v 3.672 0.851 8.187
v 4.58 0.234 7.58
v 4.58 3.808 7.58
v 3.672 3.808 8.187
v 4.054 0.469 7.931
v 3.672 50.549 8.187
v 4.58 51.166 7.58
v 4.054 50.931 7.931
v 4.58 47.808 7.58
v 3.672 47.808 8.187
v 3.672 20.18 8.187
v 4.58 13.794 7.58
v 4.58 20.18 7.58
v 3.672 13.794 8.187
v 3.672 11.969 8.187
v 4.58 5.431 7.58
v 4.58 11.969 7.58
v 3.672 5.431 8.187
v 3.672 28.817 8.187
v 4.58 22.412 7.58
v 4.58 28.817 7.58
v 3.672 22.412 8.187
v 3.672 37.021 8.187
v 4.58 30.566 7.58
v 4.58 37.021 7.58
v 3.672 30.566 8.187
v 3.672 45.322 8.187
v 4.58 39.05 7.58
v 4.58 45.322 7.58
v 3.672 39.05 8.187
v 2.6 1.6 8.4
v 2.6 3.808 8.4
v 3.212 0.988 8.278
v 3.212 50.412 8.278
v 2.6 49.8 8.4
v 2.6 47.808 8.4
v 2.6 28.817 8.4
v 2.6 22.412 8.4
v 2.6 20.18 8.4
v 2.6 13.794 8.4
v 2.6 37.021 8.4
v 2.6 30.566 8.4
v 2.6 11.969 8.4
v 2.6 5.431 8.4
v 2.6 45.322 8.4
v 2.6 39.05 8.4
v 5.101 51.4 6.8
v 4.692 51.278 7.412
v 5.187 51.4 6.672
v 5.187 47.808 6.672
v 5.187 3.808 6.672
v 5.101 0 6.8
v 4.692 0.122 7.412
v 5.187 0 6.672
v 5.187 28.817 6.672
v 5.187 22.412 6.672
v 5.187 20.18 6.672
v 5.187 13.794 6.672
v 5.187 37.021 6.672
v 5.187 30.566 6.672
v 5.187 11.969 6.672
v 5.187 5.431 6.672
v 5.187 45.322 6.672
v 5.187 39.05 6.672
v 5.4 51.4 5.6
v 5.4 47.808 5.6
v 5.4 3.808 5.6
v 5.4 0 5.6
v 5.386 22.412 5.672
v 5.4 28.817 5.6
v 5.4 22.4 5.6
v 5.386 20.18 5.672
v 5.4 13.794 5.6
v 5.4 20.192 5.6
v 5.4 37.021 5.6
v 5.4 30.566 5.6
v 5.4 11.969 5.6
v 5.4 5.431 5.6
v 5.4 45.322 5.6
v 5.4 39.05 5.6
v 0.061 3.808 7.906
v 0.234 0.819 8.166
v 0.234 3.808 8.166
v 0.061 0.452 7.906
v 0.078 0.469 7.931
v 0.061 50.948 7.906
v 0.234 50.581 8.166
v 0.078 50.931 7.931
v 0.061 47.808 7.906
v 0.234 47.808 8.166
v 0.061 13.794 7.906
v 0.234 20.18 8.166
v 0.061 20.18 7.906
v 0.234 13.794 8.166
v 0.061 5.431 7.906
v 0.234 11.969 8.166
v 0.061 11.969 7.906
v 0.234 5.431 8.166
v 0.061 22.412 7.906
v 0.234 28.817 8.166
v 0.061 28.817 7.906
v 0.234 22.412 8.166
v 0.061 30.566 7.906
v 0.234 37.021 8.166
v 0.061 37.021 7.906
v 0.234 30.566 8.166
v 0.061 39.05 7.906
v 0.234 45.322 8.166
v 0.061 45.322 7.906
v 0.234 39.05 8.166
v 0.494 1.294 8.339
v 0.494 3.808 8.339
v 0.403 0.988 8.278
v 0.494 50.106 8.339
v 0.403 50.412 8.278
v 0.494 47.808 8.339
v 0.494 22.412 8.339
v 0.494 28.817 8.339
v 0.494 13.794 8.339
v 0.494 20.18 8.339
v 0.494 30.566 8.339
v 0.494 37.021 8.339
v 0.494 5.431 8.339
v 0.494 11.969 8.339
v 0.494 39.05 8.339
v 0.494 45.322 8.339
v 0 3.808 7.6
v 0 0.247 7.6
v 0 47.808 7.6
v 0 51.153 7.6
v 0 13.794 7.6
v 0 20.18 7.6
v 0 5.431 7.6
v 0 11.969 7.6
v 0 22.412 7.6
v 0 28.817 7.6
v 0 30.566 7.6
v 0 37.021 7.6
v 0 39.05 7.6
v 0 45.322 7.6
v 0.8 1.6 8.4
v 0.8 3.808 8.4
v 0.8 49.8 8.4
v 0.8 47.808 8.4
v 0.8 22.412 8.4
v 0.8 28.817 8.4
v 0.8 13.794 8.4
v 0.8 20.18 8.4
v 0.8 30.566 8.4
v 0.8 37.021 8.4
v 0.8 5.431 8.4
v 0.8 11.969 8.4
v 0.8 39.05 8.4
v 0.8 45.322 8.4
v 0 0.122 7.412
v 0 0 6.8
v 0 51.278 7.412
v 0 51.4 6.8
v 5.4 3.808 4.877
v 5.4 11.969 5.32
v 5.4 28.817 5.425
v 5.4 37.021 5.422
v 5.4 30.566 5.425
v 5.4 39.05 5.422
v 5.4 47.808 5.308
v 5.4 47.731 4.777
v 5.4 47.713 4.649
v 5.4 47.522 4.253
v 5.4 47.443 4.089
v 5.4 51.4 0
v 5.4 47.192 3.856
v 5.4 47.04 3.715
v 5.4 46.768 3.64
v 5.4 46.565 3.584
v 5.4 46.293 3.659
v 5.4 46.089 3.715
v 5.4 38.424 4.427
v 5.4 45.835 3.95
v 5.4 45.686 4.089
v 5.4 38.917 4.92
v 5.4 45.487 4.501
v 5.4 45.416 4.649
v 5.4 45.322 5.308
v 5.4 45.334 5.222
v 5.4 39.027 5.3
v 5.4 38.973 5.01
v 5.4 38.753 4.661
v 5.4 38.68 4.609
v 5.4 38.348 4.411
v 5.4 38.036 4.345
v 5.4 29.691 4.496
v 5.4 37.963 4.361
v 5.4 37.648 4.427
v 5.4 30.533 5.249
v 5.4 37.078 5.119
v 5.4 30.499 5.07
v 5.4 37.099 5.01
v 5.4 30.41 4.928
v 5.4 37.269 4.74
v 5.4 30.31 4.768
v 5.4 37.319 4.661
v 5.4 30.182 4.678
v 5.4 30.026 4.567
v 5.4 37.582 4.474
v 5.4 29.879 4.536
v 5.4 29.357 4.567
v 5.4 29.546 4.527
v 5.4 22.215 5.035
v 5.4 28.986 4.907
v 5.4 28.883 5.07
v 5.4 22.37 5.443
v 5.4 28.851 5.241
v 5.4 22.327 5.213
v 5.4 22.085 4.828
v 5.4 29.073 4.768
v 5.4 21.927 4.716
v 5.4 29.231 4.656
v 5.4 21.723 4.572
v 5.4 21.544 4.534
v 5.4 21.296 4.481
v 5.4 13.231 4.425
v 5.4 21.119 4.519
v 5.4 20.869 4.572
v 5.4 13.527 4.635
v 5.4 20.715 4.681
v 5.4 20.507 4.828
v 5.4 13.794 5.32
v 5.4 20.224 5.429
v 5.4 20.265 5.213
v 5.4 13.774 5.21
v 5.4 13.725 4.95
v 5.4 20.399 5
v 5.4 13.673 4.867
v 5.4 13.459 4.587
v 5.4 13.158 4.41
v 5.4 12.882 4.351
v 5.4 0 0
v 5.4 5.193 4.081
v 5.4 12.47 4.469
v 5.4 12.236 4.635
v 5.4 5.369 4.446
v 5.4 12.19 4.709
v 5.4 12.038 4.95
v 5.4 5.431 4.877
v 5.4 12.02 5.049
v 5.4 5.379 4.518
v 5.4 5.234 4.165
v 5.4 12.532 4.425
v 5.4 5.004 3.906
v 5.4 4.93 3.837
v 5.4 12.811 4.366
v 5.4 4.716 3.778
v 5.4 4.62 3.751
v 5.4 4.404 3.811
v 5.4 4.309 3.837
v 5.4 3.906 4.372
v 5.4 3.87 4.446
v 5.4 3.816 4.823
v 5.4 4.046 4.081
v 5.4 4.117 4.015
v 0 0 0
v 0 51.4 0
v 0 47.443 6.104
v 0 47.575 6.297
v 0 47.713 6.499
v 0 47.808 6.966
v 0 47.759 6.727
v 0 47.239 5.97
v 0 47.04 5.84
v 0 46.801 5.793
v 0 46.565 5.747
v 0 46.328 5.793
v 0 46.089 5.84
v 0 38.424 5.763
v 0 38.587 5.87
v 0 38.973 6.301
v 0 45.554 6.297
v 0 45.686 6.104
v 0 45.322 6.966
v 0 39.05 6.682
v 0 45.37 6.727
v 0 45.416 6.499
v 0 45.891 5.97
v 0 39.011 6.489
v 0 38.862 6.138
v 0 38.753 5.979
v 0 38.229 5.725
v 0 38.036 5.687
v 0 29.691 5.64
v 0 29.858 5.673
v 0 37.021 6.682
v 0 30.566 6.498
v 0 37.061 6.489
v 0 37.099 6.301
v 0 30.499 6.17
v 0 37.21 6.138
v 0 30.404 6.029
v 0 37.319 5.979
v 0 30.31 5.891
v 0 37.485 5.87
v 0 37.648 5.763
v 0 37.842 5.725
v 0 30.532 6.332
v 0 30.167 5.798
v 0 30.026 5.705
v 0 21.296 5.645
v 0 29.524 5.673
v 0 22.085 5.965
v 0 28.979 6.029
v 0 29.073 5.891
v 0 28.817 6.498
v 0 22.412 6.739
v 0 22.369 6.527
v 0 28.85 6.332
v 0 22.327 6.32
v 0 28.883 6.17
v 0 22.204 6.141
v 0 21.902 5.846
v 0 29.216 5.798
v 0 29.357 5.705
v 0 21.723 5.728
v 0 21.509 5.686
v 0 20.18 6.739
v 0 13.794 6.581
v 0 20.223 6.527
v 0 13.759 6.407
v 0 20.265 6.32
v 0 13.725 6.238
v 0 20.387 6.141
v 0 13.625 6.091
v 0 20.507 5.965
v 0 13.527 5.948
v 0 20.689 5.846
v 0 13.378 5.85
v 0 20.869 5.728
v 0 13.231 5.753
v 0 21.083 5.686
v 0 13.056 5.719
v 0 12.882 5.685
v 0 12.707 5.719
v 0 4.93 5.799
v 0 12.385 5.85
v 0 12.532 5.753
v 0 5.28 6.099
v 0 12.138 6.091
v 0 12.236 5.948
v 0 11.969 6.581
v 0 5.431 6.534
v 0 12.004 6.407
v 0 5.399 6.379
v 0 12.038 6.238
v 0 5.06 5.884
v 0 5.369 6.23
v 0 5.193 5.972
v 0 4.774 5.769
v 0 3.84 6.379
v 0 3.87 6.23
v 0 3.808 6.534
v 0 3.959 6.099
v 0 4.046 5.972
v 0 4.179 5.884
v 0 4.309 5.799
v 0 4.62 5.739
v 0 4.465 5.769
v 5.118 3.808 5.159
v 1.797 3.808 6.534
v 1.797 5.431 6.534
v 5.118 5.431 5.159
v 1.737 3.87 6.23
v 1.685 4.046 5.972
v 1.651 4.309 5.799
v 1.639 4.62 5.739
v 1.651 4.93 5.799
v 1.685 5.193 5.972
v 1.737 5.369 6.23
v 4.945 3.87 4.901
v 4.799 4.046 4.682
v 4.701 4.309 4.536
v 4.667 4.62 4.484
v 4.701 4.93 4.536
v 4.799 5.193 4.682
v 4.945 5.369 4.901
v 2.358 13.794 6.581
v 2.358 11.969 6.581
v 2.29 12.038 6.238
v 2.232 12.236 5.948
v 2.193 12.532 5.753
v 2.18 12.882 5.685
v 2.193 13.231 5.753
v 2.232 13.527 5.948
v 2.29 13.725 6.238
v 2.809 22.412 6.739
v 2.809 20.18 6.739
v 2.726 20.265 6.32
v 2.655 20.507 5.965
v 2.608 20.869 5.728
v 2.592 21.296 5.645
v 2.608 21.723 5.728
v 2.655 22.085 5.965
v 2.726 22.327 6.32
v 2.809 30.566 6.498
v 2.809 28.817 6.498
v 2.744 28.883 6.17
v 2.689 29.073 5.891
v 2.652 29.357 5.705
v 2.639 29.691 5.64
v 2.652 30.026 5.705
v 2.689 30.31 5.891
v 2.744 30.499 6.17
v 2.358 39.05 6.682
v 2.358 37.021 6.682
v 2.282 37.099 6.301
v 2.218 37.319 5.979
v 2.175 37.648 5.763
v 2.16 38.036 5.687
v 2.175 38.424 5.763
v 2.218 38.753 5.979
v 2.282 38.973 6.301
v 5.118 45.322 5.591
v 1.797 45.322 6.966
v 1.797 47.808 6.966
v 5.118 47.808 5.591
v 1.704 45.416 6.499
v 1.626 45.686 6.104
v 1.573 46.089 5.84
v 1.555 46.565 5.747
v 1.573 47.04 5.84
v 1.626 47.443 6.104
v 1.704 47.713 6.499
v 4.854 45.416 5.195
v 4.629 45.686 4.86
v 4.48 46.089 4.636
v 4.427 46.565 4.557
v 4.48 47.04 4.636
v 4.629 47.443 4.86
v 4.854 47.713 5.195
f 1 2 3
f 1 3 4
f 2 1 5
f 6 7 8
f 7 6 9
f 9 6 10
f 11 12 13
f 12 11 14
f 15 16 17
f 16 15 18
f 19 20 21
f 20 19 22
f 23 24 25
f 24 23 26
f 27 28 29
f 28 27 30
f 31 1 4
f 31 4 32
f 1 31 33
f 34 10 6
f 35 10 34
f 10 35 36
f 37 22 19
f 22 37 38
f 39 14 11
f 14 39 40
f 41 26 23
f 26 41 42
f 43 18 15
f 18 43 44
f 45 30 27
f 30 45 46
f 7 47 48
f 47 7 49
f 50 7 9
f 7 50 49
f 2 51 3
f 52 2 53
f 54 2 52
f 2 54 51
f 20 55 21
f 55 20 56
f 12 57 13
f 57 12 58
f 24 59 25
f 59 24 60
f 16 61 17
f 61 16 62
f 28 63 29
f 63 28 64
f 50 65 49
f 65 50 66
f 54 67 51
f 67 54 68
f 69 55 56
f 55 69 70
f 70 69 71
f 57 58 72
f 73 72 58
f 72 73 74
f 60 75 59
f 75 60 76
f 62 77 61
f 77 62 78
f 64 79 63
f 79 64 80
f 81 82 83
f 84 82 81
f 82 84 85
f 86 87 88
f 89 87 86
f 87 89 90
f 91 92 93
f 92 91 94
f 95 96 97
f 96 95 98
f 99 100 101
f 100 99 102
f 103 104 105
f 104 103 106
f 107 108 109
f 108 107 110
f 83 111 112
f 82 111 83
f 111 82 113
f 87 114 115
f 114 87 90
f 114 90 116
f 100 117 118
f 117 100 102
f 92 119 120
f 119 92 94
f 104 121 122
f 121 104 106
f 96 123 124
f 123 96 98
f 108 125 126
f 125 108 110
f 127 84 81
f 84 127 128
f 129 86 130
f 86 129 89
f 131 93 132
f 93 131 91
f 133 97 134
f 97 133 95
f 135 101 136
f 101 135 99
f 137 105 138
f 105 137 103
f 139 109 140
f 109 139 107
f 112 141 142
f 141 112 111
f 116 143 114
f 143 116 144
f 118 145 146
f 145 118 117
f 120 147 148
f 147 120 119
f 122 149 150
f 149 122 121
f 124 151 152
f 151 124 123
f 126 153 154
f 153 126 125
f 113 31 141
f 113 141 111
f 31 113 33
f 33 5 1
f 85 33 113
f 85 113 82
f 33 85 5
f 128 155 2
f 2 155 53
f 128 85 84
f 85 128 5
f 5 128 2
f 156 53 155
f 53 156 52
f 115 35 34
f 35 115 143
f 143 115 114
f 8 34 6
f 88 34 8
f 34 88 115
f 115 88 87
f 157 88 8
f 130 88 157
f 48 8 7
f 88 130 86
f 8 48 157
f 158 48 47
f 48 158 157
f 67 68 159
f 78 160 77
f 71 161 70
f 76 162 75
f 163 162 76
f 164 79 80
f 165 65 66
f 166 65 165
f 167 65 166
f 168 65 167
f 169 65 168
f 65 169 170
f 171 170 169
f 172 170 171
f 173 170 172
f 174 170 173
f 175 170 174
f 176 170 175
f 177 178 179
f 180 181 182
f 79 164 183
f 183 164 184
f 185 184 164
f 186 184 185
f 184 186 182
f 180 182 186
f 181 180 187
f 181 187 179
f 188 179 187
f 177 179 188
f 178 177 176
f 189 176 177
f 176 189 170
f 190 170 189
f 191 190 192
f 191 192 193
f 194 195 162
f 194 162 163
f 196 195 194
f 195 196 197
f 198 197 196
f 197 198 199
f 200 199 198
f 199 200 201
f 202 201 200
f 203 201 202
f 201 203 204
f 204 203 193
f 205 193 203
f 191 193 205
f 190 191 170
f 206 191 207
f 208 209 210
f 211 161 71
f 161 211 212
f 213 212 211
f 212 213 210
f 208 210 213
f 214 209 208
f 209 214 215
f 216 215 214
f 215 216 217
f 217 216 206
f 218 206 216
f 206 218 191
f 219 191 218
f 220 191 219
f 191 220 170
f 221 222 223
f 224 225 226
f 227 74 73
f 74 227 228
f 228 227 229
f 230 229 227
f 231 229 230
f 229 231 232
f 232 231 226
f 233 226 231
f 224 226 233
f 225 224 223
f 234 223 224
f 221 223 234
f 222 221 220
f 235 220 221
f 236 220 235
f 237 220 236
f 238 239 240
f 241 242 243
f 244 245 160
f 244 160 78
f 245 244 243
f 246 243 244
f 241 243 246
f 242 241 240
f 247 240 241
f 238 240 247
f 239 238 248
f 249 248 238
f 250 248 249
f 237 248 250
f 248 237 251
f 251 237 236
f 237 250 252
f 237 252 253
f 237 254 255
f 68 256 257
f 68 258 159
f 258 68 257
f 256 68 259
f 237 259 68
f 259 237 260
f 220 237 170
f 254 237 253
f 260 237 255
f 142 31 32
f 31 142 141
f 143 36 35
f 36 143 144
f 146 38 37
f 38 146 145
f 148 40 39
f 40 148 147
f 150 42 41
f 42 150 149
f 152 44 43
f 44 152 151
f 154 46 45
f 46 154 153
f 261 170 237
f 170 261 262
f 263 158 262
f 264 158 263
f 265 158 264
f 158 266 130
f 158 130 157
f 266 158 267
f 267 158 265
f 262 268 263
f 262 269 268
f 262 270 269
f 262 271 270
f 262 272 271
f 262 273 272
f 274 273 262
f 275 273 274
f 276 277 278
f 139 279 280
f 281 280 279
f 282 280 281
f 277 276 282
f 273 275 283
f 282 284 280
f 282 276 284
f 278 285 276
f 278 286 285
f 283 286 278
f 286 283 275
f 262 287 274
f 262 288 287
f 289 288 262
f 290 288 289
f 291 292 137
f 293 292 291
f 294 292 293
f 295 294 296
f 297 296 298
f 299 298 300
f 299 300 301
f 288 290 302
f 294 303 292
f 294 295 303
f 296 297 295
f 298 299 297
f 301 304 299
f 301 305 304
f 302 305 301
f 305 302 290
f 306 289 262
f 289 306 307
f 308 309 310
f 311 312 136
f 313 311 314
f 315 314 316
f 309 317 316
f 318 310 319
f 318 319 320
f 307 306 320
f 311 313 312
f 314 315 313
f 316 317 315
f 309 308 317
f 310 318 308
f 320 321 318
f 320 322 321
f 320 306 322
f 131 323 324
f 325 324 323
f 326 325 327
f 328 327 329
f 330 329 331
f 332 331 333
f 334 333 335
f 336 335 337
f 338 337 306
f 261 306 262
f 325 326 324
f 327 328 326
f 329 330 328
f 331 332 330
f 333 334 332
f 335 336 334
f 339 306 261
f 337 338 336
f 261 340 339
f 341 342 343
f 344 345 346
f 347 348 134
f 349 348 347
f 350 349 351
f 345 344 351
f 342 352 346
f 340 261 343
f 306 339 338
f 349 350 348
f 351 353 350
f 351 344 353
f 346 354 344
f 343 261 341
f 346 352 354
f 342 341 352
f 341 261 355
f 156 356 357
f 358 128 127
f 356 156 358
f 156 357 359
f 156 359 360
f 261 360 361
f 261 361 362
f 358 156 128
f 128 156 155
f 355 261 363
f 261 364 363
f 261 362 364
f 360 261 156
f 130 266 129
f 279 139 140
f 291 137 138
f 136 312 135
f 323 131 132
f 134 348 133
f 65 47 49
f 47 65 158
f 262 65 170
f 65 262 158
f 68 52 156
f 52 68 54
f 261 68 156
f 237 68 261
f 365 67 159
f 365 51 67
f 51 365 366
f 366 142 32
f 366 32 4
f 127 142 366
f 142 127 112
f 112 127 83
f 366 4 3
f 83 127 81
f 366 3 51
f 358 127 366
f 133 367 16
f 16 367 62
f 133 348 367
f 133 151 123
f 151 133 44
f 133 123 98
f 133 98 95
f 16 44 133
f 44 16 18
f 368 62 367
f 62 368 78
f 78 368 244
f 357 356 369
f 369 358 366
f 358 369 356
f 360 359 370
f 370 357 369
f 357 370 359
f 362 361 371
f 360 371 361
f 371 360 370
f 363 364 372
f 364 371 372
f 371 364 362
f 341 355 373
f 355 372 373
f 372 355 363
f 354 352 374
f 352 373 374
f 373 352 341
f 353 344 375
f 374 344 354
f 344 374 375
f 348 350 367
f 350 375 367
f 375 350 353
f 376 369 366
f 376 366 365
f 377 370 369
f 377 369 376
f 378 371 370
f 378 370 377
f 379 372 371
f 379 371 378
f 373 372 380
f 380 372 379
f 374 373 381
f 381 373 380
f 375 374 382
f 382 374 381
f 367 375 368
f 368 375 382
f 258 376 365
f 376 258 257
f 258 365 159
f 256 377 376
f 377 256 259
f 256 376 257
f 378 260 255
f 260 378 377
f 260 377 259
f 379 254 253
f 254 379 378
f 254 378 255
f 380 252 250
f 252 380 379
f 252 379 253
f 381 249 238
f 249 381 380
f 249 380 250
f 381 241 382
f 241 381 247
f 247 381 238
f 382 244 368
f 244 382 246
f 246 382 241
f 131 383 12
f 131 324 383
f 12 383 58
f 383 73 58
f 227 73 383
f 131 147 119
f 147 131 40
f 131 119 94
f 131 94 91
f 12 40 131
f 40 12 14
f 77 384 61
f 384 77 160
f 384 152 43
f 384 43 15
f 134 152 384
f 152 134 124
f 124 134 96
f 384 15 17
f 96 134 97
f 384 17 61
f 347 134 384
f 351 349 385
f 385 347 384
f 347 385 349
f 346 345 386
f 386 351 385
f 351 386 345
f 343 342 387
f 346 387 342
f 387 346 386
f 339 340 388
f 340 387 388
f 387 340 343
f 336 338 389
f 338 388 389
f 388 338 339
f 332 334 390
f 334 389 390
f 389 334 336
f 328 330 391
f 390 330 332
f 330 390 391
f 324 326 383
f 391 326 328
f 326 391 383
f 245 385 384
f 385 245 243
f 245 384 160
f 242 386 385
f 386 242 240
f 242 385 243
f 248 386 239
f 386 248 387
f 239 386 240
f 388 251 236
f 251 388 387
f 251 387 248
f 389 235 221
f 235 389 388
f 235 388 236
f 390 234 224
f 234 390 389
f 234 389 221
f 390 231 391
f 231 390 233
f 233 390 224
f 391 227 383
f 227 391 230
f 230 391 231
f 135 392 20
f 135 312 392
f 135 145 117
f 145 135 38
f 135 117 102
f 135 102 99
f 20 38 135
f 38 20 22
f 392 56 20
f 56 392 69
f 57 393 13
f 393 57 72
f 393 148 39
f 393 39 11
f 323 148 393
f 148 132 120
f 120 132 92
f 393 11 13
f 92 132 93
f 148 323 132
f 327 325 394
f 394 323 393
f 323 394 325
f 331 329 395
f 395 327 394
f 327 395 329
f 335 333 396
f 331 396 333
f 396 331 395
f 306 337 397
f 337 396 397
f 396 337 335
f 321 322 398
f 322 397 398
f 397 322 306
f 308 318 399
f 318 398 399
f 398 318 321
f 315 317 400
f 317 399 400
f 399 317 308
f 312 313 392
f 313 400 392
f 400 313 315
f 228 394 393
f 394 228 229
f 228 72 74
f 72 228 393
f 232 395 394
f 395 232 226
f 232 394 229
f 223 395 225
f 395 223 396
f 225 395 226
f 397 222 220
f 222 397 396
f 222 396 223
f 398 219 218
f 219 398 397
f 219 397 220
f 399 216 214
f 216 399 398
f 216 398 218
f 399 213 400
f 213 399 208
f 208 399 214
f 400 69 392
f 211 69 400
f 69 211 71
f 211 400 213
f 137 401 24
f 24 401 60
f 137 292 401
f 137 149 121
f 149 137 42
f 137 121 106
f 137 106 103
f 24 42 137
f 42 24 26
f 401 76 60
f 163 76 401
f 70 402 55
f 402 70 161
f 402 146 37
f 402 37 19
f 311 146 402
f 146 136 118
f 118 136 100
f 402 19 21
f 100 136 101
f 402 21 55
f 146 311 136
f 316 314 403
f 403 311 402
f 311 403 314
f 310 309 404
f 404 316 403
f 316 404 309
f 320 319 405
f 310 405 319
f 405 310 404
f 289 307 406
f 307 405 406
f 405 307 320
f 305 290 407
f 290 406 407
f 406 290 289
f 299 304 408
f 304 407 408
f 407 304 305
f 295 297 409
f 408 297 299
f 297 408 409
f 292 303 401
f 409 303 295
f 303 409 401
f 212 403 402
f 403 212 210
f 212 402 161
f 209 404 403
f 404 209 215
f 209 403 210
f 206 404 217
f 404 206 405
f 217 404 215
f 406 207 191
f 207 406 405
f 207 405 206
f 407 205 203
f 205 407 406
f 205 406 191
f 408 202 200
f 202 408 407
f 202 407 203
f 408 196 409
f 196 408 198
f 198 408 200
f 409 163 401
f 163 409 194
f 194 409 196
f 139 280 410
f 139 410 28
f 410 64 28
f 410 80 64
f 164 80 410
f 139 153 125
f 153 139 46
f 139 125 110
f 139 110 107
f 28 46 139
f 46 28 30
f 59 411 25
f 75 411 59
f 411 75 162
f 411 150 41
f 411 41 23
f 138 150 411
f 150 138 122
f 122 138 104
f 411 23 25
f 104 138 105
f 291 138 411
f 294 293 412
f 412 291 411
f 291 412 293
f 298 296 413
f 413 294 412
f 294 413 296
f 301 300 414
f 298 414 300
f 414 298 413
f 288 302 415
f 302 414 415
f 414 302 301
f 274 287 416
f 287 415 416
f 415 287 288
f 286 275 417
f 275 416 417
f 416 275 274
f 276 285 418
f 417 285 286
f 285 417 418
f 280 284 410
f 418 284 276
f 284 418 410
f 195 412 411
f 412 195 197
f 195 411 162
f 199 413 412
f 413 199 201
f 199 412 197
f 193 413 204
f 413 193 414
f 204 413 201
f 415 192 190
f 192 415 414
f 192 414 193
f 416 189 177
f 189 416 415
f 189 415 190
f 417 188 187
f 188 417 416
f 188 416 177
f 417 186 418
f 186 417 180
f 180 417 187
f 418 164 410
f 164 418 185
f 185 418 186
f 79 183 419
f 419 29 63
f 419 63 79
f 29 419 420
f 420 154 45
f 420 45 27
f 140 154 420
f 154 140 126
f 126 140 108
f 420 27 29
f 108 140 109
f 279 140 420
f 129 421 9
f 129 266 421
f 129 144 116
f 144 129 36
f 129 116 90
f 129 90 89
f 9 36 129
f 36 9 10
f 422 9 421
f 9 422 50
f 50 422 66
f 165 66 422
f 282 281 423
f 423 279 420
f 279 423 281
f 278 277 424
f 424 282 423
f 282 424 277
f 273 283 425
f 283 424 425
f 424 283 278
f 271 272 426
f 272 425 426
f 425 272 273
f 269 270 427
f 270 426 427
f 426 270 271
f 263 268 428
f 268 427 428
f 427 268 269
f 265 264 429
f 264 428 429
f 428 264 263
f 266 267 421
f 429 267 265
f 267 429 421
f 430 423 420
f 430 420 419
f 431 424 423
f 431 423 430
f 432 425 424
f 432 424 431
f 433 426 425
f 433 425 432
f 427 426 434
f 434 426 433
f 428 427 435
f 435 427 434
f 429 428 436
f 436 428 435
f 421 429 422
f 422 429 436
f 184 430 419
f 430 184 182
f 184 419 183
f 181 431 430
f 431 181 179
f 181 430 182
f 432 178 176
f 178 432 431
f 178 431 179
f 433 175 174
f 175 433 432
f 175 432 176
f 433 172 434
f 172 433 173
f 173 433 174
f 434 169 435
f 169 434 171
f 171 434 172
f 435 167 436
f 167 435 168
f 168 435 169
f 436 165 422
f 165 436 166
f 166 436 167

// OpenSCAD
// file: shapes.scad
// The invocation `hollow_cylinder(h, r0, r1)` produces a hollow cylinder
// with the height `h`, the inner radius `r0` and the outer radius `r1`.
// The base of the cylinder is placed at the origin and
// its height grows along the `z` axis.
module hollow_cylinder(h, r0, r1) {
  difference() {
    cylinder(h, r1, r1);
    translate([0, 0, - $e])
      cylinder(2 * $e + h, r0, r0);
  }
}

// The invocation `torus(r0, r1)` produces a torus
// with the toroidal radius (the distance
// from the center of mass of the torus
// to the centerline of the tube) `r0` and
// the poloidal radius (the distance
// from the centerline of the tube
// to the surface of the torus) `r1`.
// The center of mass of the torus is placed at the origin and
// the tube revolves around the `z` axis.
module torus(r0, r1) {
  translate([0, 0, - r1])
    rotate_extrude()
    translate([r0, r1, 0])
    circle(r1);
}
// file: functions.scad
/// The invocation `rep(n, v, a)` produces `n` repetitions
/// of the elements of the vector `v`,
/// starting from the accumulator value `a`.
function rep(n, v, a = []) =
  0 < n ? rep(n - 1, v, concat(v, a)) : a;

/// The invocation `rev(v, i, a)` reverses the order
/// of the elements of the vector `v`,
/// starting from the index `i` and the accumulator value `a`.
function rev(v, i = 0, a = []) =
  i < len(v) ? rev(v, 1 + i, concat([v[i]], a)) : a;

/// The invocation `sum(v, i, a)` yields the sum
/// of the elements of the vector `v`,
/// starting from the index `i` and the accumulator value `a`.
function sum(v, i = 0, a = 0) =
  i < len(v) ? sum(v, 1 + i, a + v[i]) : a;

/// The invocation `cumsum(v, i, a)` yields a vector
/// of the cumulative partial sums of the elements of the vector `v`,
/// starting from the index `i` and the accumulator value `a`.
function cumsum(v, i = 0, a = 0) =
  i < len(v) ? concat([a], cumsum(v, 1 + i, a + v[i])) : a;
// main file
$e = 0.01;
$fn = 16;

use <functions.scad>
use <shapes.scad>

/// Depth of the part (along the neck).
x_part = 5.4;
/// Width of the part (across the neck).
y_part = 50.0 + 1.4;
/// Height of the part (through the neck).
/// TODO Try to drop this by 0.4 to adjust the action.
z_part = 8.8 - 0.4;

/// How much shallower the grooves should be to account for wear.
z_extra = 0.5;
/// Depths of the grooves on the sharp edge (with room to accommodate wear).
z_groove = 3.0 - z_extra;
echo(z_groove = z_groove);
assert(z_groove < z_part,
    "Grooves are deeper than they should be!");
/// How much fitting room the strings should have.
d_extra = 0.1;
/// Diameters of the strings.
d_strings = [0.7112, 0.8128, 1.016, 0.7747, 0.9144, 1.143];
/// Widths of the grooves (with room to accommodate fitting).
y_grooves = [for (d_string = d_strings) d_extra + d_string];
echo(y_grooves = y_grooves);
/// Cumulative widths of the grooves.
y_grooves_sum = cumsum(y_grooves);
/// Distances between the grooves.
y_steps = rep(len(y_grooves) - 1, 7.4);
assert(1 + len(y_steps) == len(y_grooves),
    "Grooves are more or less numerous than they should be!");
/// Cumulative distances between the grooves.
y_steps_sum = cumsum(y_steps);
/// Distance between the first (and last) groove and the edge.
y_edge = (y_part - y_grooves_sum[len(y_grooves)]
    - y_steps_sum[len(y_grooves) - 1]) / 2;
echo(y_edge = y_edge);
assert(y_edge >= 0,
    "Grooves are wider than they should be!");

/// Angles at which the strings turn
/// from the neck towards their anchoring points.
alpha_anchors = [asin(34 / 58), asin(42 / 94), asin(48 / 128)];
/// Angles at which the grooves turn.
alpha_grooves = concat(alpha_anchors, rev(alpha_anchors));
echo(alpha_grooves = alpha_grooves);
assert(max(alpha_grooves) < 90,
    "Grooves turn more than they should!");
/// Radii of curvature of the grooves.
r_grooves = [for (alpha_groove = alpha_grooves) x_part / sin(alpha_groove)];
echo(r_grooves = r_grooves);
/// Radius of curvature of the round edge (farther away from the neck).
r_anchor = z_part - 5.6;
echo(r_anchor = r_anchor);
/// Radius of curvature of the sharp edge (closer to the neck).
r_neck = 0.8;
/// Radii of curvature of the sides.
r_side = 1.6;
assert(r_anchor + r_neck < x_part && 2 * r_side < y_part,
    "Fillets are larger than they should be!");

module block() {
  cube([x_part, y_part, z_part]);
}

module fillet(r) {
  translate([- r, 0, - r])
    difference() {
      translate([0, - $e, 0])
        cube([$e + r, 2 * $e + y_part, $e + r]);
      translate([0, - 2 * $e, 0])
        rotate([- 90, 0, 0])
        cylinder(4 * $e + y_part, r, r);
    }
}

module filleted_block() {
  difference() {
    block();
    translate([x_part, 0, z_part])
      fillet(r_anchor);
    translate([0, 0, z_part])
      mirror([1, 0, 0])
      fillet(r_neck);
    translate([0, 0, z_part])
      rotate([0, 0, - 90])
      fillet(r_side);
    translate([0, y_part, z_part])
      mirror([0, 1, 0])
      rotate([0, 0, - 90])
      fillet(r_side);
  }
}

module grooves(i) {
  let (y_groove = y_grooves[i], r_groove = r_grooves[i])
    translate([0, 0, z_part - r_groove + y_groove])
    /// This rotation is here just to accommodate low values of `$fn`.
    rotate([0, 180 / $fn, 0])
    rotate([90, 0, 0]) {
      translate([0, 0, - y_groove])
        hollow_cylinder(2 * y_groove, r_groove, z_part + r_groove);
      torus(r_groove, y_groove);
    }
}

module grooved_filleted_block() {
  difference() {
    filleted_block();
    for (i = [0 : len(y_grooves) - 1])
      translate([0, y_edge + y_grooves_sum[i]
          + y_steps_sum[i] + y_grooves[i] / 2, - z_groove])
        grooves(i);
  }
}

grooved_filleted_block();
